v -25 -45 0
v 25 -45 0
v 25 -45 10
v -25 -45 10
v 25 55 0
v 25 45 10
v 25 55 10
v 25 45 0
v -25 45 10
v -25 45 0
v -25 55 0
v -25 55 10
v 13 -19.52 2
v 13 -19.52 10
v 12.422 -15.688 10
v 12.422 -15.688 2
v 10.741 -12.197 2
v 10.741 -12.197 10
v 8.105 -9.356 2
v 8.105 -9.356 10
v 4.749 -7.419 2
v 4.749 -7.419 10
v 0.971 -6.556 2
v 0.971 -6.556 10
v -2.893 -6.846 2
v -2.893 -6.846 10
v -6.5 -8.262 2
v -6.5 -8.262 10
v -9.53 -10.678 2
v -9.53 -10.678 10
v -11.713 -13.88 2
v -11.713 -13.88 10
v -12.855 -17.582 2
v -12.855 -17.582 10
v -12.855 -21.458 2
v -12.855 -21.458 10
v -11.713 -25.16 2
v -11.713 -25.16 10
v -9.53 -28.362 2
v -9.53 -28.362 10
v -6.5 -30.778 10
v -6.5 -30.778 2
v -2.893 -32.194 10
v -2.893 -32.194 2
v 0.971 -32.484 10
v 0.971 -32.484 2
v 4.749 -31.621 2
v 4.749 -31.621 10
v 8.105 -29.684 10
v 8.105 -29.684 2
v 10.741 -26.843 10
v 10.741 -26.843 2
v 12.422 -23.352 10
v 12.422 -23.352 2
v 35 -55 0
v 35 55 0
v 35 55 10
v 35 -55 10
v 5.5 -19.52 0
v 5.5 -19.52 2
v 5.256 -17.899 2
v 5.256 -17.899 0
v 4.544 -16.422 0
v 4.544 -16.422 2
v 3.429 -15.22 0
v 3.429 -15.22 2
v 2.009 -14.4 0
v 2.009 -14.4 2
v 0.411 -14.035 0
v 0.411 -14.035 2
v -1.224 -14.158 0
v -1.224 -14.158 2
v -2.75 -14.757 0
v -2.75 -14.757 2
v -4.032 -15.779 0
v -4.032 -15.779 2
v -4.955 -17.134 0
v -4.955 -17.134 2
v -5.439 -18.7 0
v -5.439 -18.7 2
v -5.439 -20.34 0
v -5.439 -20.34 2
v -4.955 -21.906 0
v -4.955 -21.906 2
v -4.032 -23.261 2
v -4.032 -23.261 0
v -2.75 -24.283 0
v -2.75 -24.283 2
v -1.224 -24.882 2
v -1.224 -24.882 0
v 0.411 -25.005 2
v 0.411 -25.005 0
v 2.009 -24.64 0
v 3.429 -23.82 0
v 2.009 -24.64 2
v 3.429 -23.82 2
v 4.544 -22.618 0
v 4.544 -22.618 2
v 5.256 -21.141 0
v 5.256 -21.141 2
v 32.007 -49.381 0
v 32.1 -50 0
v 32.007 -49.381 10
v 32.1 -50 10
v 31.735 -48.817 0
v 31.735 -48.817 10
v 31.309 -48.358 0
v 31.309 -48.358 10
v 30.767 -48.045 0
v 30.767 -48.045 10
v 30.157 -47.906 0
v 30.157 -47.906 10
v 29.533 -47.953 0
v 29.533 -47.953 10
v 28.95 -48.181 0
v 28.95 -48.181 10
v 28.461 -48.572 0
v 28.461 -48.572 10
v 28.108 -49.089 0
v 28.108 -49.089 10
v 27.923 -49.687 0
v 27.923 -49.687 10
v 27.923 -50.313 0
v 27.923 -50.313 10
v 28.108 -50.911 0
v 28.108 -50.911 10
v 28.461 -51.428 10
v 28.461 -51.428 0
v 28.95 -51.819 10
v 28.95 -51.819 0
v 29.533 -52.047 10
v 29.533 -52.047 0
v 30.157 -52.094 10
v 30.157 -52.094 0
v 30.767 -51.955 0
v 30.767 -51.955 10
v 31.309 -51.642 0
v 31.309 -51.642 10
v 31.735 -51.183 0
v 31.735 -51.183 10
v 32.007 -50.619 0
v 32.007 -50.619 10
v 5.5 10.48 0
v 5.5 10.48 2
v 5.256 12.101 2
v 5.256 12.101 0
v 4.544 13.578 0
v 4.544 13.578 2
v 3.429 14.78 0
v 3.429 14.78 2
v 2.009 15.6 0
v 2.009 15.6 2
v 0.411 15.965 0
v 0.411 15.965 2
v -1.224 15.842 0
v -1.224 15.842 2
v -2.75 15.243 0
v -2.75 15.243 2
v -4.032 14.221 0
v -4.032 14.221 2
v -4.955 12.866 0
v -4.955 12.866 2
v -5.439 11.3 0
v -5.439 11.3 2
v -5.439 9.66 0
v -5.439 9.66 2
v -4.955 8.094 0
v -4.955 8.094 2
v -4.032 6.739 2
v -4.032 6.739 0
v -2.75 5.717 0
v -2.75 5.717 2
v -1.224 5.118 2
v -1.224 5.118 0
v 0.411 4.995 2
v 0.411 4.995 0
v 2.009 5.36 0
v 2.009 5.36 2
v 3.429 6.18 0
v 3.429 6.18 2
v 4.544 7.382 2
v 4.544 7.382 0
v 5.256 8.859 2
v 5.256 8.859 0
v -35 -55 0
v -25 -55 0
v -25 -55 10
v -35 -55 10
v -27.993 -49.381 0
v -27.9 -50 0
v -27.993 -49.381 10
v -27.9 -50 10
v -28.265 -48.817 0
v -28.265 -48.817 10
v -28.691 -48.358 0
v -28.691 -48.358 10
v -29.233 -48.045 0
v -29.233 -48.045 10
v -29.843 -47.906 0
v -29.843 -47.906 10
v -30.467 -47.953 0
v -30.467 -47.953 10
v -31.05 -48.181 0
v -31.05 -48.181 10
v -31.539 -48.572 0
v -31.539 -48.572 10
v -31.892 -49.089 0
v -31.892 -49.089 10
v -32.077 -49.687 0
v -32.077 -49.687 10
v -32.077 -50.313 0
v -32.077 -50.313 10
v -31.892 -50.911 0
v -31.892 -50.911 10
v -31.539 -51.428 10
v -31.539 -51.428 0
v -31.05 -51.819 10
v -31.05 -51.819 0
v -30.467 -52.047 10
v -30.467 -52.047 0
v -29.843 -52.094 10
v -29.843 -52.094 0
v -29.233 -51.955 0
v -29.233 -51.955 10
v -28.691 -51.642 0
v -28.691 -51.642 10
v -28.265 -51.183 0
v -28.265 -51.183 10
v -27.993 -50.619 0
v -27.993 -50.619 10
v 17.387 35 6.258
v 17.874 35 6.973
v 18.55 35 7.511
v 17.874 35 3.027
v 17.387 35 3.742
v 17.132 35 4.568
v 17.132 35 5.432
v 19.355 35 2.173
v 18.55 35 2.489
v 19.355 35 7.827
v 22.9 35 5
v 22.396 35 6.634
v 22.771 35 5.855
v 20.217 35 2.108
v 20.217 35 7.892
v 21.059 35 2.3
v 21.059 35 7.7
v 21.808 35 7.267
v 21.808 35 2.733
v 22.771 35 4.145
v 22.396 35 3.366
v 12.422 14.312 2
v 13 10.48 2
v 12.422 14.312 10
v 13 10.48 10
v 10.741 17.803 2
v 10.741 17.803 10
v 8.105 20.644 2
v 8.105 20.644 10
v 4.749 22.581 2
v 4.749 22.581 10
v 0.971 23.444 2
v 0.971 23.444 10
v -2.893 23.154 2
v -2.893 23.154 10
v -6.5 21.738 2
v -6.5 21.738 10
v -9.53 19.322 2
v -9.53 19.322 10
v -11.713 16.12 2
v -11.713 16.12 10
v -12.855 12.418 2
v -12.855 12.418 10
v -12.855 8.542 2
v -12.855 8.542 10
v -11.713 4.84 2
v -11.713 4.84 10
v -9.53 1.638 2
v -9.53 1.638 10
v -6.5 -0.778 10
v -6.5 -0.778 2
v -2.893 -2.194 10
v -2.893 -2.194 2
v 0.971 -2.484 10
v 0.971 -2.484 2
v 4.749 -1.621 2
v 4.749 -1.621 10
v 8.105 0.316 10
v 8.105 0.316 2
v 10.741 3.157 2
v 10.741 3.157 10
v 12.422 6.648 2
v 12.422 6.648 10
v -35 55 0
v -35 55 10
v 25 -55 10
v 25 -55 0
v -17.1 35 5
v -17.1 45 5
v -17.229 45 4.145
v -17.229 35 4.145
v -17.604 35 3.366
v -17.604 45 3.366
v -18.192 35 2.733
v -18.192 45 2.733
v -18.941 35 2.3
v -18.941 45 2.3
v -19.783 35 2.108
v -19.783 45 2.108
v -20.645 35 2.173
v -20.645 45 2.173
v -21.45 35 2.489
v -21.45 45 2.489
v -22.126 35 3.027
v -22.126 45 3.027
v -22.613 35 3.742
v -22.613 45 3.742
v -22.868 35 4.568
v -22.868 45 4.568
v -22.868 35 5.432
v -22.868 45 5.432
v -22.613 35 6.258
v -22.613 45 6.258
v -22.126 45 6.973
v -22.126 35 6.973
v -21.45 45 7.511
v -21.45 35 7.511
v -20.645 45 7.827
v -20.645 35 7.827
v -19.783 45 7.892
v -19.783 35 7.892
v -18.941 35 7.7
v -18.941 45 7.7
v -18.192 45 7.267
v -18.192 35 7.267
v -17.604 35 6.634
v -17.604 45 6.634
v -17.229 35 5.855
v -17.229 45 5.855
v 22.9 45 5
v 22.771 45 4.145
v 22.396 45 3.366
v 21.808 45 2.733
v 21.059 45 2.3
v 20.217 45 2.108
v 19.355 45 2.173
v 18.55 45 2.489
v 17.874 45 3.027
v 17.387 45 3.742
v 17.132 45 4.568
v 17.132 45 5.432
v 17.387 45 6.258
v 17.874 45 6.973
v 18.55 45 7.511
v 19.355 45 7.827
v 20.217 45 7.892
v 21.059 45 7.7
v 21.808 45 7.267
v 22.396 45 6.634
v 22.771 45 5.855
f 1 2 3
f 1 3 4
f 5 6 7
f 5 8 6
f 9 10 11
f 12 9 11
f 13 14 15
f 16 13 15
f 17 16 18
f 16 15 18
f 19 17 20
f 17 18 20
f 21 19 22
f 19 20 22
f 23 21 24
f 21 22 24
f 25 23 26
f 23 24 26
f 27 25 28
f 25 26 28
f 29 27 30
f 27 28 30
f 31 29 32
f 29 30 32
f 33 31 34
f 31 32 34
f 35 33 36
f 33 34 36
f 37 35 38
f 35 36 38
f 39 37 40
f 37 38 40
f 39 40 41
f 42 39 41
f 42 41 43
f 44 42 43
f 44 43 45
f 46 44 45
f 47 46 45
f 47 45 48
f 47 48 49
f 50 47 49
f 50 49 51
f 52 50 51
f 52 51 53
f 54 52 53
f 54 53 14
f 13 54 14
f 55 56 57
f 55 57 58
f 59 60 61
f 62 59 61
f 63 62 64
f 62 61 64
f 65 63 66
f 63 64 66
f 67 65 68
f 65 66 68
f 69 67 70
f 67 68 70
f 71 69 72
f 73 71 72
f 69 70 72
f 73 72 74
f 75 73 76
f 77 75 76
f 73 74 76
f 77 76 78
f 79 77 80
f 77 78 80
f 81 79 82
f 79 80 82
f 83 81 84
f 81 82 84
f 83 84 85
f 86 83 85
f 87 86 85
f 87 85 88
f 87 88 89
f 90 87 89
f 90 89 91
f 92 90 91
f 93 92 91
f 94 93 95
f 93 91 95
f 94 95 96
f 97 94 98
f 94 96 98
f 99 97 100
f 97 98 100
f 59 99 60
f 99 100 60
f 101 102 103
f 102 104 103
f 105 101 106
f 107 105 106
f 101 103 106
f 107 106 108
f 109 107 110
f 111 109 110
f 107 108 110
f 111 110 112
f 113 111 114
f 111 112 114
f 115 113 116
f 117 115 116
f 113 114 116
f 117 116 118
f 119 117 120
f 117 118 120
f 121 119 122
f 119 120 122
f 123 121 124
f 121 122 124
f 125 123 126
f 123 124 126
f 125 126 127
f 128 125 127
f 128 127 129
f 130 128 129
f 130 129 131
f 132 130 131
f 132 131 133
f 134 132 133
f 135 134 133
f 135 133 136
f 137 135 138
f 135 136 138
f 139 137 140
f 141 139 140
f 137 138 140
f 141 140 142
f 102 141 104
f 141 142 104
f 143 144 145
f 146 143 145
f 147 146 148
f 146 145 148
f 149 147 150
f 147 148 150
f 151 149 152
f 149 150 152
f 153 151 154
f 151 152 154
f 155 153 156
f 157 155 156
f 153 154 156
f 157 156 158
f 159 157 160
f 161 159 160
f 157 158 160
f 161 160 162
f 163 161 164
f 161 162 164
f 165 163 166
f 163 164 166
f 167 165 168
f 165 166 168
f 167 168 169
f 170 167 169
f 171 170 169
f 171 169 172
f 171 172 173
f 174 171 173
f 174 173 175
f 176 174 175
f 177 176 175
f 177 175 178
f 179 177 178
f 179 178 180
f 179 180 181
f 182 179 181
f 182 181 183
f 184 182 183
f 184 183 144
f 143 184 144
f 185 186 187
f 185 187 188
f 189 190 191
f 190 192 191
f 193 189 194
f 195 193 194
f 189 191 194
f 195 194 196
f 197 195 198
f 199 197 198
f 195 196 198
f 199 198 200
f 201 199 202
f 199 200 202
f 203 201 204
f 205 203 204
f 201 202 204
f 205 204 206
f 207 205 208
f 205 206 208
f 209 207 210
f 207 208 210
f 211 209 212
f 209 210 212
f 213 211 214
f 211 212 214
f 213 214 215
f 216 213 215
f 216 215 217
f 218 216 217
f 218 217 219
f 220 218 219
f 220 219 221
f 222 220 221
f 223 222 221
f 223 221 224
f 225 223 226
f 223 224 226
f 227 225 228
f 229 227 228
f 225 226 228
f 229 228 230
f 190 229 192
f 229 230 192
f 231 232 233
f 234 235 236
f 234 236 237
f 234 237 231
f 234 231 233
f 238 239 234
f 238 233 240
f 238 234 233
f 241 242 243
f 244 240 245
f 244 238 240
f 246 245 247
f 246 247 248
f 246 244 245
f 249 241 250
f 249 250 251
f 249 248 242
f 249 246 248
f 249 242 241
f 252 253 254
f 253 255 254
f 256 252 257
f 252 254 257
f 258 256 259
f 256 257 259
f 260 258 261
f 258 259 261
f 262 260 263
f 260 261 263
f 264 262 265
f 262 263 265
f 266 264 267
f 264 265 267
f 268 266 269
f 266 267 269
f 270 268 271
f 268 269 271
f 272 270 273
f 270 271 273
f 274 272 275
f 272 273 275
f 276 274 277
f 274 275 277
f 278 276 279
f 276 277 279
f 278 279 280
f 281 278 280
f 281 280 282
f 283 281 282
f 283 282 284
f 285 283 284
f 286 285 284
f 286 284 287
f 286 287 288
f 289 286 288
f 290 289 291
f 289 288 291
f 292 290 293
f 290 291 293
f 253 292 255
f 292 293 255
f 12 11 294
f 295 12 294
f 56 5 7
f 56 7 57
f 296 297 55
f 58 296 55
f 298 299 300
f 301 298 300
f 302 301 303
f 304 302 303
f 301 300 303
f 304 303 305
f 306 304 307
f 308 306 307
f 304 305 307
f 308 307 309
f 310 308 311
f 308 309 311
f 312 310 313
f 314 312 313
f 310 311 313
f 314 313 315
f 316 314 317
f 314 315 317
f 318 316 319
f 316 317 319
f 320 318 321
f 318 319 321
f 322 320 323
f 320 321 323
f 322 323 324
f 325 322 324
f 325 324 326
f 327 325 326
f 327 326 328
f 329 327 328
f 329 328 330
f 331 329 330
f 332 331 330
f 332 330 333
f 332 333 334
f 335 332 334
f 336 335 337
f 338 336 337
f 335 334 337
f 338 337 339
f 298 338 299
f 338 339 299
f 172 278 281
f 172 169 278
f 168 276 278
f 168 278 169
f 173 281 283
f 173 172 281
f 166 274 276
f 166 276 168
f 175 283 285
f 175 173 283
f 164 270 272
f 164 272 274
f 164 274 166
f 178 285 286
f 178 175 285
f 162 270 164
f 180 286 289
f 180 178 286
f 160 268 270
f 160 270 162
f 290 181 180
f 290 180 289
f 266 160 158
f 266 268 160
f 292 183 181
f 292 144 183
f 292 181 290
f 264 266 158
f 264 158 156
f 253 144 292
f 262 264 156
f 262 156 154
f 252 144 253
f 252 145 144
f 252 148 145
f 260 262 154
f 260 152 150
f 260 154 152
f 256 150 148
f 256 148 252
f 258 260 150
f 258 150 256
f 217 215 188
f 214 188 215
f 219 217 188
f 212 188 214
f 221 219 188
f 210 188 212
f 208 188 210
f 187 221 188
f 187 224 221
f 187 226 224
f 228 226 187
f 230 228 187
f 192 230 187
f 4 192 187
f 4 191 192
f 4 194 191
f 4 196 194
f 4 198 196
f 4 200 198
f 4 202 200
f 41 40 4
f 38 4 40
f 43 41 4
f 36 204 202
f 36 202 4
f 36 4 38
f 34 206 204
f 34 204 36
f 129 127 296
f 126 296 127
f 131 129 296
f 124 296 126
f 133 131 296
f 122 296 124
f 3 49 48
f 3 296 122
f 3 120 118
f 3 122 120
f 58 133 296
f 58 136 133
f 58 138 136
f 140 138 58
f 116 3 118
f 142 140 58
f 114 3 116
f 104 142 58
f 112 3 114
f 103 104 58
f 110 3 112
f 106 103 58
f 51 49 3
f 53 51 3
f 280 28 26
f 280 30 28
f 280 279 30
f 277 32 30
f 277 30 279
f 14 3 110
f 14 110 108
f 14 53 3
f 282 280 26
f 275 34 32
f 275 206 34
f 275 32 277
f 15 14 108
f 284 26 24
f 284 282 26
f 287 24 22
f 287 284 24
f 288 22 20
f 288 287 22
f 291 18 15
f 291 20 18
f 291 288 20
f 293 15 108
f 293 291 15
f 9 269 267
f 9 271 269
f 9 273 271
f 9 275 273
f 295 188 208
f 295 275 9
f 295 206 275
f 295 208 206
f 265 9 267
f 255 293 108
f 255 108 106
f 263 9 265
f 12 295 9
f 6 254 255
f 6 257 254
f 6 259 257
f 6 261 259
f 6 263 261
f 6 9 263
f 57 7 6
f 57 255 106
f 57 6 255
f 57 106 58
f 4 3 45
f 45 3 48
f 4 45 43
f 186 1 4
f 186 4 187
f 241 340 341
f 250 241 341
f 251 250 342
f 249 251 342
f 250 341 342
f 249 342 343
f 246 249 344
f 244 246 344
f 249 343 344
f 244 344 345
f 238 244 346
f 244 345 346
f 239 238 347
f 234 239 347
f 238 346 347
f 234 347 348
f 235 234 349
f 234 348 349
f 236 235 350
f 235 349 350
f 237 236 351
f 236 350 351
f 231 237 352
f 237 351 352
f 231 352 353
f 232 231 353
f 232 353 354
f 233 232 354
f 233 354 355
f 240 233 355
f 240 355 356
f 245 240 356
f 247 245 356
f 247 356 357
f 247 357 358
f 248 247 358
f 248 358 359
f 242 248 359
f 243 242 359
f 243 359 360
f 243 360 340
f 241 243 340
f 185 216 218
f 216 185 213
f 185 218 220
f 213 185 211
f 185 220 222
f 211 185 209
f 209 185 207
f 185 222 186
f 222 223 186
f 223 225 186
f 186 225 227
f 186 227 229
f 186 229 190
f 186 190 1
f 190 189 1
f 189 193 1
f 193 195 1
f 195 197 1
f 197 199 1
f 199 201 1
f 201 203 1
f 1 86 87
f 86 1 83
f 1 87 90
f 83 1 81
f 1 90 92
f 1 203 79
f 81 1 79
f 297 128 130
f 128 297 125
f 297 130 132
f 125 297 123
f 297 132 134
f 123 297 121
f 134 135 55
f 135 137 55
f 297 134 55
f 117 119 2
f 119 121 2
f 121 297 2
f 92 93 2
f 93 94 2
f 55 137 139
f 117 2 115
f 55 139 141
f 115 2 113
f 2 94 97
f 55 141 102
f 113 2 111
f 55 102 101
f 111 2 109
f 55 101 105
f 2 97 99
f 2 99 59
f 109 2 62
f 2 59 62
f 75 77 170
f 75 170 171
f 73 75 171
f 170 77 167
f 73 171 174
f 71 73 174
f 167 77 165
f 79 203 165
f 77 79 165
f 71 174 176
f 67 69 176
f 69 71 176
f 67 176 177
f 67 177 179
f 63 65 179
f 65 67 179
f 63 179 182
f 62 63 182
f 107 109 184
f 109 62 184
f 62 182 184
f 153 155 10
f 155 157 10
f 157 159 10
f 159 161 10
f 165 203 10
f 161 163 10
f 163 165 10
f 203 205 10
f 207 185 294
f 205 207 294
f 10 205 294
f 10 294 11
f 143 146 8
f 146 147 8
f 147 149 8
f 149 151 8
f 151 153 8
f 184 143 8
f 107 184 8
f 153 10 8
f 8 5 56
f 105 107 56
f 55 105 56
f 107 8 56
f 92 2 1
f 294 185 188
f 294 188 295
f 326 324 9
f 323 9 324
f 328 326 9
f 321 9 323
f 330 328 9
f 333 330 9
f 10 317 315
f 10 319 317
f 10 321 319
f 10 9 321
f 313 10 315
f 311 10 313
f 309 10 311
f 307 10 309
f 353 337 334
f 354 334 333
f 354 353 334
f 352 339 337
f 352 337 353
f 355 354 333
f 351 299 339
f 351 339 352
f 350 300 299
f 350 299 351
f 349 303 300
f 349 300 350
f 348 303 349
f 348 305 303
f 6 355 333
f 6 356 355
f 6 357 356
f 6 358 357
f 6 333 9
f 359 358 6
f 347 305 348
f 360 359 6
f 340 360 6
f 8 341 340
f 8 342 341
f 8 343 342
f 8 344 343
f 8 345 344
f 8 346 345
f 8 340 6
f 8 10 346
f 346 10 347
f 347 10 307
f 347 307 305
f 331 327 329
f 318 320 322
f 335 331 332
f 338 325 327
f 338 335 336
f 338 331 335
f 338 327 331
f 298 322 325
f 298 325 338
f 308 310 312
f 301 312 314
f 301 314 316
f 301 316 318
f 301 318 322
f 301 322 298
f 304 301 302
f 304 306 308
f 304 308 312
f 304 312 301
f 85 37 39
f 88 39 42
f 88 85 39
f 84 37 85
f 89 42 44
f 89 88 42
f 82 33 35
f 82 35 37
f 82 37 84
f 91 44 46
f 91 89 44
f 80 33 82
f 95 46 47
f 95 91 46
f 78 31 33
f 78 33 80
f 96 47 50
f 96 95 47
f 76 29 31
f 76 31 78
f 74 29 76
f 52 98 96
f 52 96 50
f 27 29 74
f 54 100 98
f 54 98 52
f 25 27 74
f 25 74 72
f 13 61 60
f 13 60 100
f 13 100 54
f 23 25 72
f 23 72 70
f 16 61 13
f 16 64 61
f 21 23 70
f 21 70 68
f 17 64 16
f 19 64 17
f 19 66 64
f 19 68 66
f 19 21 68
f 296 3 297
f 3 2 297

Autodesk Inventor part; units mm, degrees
ref_plane "YZ Plane" through (0, 0, 0) normal (1, 0, 0) x (0, 1, 0)
ref_plane "XZ Plane" through (0, 0, 0) normal (0, 1, 0) x (-1, 0, 0)
ref_plane "XY Plane" through (0, 0, 0) normal (0, 0, 1) x (1, 0, 0)
sketch "Sketch1" plane through (0, 0, 0) normal (0, 0, 1) x (1, 0, 0)
  line L0 (-25, 45) -> (25, 45)
  line L1 (35, 44.3995) -> (35, -45)
  line L2 (25, -45) -> (-25, -45)
  line L3 (-35, -44.3995) -> (-35, 45)
  line L4 (-35, 45) -> (35, -45) construction
  line L5 (35, 44.3995) -> (-35, -44.3995) construction
  line L6 (-25, 55) -> (-35, 55)
  line L7 (-35, 55) -> (-35, 45)
  line L8 (-25, 45) -> (-25, 55)
  line L9 (-25, 55) -> (-35, 45) construction
  line L10 (-35, 55) -> (-25, 45) construction
  line L11 (0, 15.2738) -> (0, -11.5274)
  line L12 (-10.8069, 0) -> (18.2997, 0)
  line L13 (25, 55) -> (35, 55)
  line L14 (35, 55) -> (35, 44.3995)
  line L15 (25, 45) -> (25, 55)
  line L16 (25, 55) -> (35, 44.3995) construction
  line L17 (35, 55) -> (25, 45) construction
  line L18 (-25, -55) -> (-35, -55)
  line L19 (-35, -55) -> (-35, -44.3995)
  line L20 (-25, -45) -> (-25, -55)
  line L21 (-25, -55) -> (-35, -44.3995) construction
  line L22 (-35, -55) -> (-25, -45) construction
  line L23 (25, -55) -> (35, -55)
  line L24 (35, -55) -> (35, -45)
  line L25 (25, -45) -> (25, -55)
  line L26 (25, -55) -> (35, -45) construction
  line L27 (35, -55) -> (25, -45) construction
  point P0 (0, 0)
  point P1 (-30, 50)
  point P2 (30, 50)
  point P3 (-30, -50)
  point P4 (30, -50)
  dimension "d0" = 70
  dimension "d1" = 10
  dimension "d2" = 90
extrude "Extrusion1" add sketch "Sketch1" along normal blind 10
sketch "Sketch2" plane through (0, 0, 10) normal (0, 0, 1) x (1, 0, 0)
  circle A0 centre (0, 10.48) radius 13
  circle A1 centre (0, -19.52) radius 13
  line L0 (-25, -45) -> (25, -45) projected
  line L1 (-35, -55) -> (-25, -55) projected
  point P0 (0, 0)
  dimension "d6" = 26
  dimension "d11" = 26
  dimension "d15" = 30
  dimension "d40" = 35.48
extrude "Extrusion2" cut sketch "Sketch2" against normal blind 8
sketch "Sketch3" plane through (0, 10.48, 2) normal (0, 0, 1) x (1, 0, 0)
  circle A0 centre (0, 0) radius 5.5
  circle A1 centre (0, 0) radius 13 projected
  point P0 (0, -10.48)
  point P1 (-9.0139, 15)
  point P2 (9.0139, 15)
  dimension "d16" = 11
extrude "Extrusion3" cut sketch "Sketch3" against normal through all contours A0
sketch "Sketch6" plane through (0, -19.52, 2) normal (0, 0, 1) x (1, 0, 0)
  circle A0 centre (0, 0) radius 5.5
  point P0 (0, 19.52)
  dimension "d19" = 11
extrude "Extrusion4" cut sketch "Sketch6" against normal blind 10
sketch "Sketch8" plane through (-25, 45, 0) normal (0, 1, 0) x (1, 0, 0)
  circle A0 centre (5, -5) radius 2.9
  line L0 (0, 0) -> (0, -10) projected
  line L1 (50, 0) -> (0, 0) projected
  circle A1 centre (45, -5) radius 2.9
  line L2 (50, 0) -> (50, -10) projected
  point P0 (25, 0)
  dimension "d30" = 5.8
  dimension "d31" = 5
  dimension "d32" = 5
  dimension "d33" = 5.8
  dimension "d34" = 5
  dimension "d35" = 5
extrude "Extrusion6" cut sketch "Sketch8" against normal blind 10
sketch "Sketch11" plane through (0, 0, 10) normal (0, 0, 1) x (1, 0, 0)
  line L0 (-35, 55) -> (-35, -55) projected
  line L1 (-25, 55) -> (-35, 55) projected
  line L2 (0, 0) -> (0, 27.2927)
  line L3 (0, 0) -> (14.8331, 0)
  circle A0 centre (-30, -50) radius 2.1
  circle A1 centre (30, -50) radius 2.1
  line L4 (-35, -55) -> (-25, -55) projected
  line L5 (25, -45) -> (25, -55) projected
  line L6 (25, -55) -> (35, -55) projected
  point P0 (30, -55)
  dimension "d54" = 4.2
  dimension "d55" = 5
  dimension "d56" = 5
  dimension "d57" = 4.2
  dimension "d58" = 5
  dimension "d59" = 5
extrude "Extrusion9" cut sketch "Sketch11" against normal through all
sketch "Sketch7" plane through (0, -48, 10) normal (0, 0, -1) x (-1, 0, 0)
  circle A0 centre (0, 22.5) radius 1.6
  circle A1 centre (-22.5, 0) radius 1.6
  circle A2 centre (0, -22.5) radius 1.6
  circle A3 centre (22.5, 0) radius 1.6
  point P0 (0, 48)
  point P1 (0, 0)
  dimension "d22" = 3.2
  dimension "d25" = 360
  dimension "d27" = 45
equation "\"d33\" = d30"
equation "\"d57\" = d54"
equation "\"d58\" = d55"
equation "\"d59\" = d56"
properties part number "gearbox_side1" material "PMMA Plastic"
